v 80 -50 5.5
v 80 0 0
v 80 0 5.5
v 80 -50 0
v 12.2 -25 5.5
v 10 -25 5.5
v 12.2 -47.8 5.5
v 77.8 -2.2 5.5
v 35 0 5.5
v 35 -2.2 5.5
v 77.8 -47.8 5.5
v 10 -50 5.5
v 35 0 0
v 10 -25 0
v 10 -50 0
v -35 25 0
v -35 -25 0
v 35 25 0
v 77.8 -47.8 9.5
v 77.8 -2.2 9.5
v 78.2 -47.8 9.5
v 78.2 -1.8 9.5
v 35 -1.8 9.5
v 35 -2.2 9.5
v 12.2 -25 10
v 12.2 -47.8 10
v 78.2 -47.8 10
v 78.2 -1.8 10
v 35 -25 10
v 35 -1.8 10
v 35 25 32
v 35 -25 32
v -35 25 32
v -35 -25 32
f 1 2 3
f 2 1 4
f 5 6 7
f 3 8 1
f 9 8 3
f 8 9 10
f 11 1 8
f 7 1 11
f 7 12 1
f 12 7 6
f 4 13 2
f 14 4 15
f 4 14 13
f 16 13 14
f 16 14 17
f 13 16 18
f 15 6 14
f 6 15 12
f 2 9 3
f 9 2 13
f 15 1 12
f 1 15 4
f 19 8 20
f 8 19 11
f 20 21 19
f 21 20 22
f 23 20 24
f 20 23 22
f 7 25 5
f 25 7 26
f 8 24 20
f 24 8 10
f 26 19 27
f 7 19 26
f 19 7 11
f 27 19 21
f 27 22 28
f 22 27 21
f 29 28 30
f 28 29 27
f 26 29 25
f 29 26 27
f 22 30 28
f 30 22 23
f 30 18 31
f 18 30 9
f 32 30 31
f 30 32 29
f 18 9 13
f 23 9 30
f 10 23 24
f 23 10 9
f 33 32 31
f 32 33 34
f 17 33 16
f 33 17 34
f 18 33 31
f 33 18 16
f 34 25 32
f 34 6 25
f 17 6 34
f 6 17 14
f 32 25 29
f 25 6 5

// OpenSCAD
// Two-part enclosure for a small electronics board (e.g. Arduino-based temperature logger)
// Print orientation: both parts rest on the bed (z = 0), build upward, side by side.
// The lid is printed upside down: a flat plate on the bed with a lip that drops into the box.

// ---------------- Parameters ----------------
box_x      = 70;    // box outer length (X)
box_y      = 50;    // box outer width (Y)
box_z      = 30;    // box outer height (Z)
box_wall   = 2;     // box side wall thickness
box_floor  = 2;     // box floor thickness

lip_t      = 1.5;   // lip wall thickness
lip_h      = 4;     // lip height above the plate
lip_x      = 65.6;  // lip outer length (X)
lip_y      = 45.6;  // lip outer width (Y)
lip_clear  = 0.2;   // clearance between lip inner size and box opening

eps        = 0.5;   // cutter overshoot past faces

$fn = 64;

// Derived: plate thickness = lip thickness + lip height
plate_t = lip_t + lip_h;

// ---------------- Model ----------------
union() {
    // Part 1: Box (open top)
    translate([-box_x/2, -box_y/2, 0])
        cube([box_x, box_y, box_z + box_floor]);

    // Part 2: Lid (plate + lip, printed upside down)
    translate([box_x/2 + 10, -box_y/2, 0]) {
        // Base plate lying on the bed
        translate([-box_x/2, -box_y/2, 0])
            cube([box_x, box_y, plate_t]);

        // Lip: solid block, then cut the open top so it slides into the box
        translate([-lip_x/2, -lip_y/2, plate_t])
            cube([lip_x, lip_y, lip_h]);

        translate([-lip_x/2, -lip_y/2, plate_t + lip_h])
            cube([lip_x + 2*lip_clear, lip_y + 2*lip_clear, eps]);
    }
}
